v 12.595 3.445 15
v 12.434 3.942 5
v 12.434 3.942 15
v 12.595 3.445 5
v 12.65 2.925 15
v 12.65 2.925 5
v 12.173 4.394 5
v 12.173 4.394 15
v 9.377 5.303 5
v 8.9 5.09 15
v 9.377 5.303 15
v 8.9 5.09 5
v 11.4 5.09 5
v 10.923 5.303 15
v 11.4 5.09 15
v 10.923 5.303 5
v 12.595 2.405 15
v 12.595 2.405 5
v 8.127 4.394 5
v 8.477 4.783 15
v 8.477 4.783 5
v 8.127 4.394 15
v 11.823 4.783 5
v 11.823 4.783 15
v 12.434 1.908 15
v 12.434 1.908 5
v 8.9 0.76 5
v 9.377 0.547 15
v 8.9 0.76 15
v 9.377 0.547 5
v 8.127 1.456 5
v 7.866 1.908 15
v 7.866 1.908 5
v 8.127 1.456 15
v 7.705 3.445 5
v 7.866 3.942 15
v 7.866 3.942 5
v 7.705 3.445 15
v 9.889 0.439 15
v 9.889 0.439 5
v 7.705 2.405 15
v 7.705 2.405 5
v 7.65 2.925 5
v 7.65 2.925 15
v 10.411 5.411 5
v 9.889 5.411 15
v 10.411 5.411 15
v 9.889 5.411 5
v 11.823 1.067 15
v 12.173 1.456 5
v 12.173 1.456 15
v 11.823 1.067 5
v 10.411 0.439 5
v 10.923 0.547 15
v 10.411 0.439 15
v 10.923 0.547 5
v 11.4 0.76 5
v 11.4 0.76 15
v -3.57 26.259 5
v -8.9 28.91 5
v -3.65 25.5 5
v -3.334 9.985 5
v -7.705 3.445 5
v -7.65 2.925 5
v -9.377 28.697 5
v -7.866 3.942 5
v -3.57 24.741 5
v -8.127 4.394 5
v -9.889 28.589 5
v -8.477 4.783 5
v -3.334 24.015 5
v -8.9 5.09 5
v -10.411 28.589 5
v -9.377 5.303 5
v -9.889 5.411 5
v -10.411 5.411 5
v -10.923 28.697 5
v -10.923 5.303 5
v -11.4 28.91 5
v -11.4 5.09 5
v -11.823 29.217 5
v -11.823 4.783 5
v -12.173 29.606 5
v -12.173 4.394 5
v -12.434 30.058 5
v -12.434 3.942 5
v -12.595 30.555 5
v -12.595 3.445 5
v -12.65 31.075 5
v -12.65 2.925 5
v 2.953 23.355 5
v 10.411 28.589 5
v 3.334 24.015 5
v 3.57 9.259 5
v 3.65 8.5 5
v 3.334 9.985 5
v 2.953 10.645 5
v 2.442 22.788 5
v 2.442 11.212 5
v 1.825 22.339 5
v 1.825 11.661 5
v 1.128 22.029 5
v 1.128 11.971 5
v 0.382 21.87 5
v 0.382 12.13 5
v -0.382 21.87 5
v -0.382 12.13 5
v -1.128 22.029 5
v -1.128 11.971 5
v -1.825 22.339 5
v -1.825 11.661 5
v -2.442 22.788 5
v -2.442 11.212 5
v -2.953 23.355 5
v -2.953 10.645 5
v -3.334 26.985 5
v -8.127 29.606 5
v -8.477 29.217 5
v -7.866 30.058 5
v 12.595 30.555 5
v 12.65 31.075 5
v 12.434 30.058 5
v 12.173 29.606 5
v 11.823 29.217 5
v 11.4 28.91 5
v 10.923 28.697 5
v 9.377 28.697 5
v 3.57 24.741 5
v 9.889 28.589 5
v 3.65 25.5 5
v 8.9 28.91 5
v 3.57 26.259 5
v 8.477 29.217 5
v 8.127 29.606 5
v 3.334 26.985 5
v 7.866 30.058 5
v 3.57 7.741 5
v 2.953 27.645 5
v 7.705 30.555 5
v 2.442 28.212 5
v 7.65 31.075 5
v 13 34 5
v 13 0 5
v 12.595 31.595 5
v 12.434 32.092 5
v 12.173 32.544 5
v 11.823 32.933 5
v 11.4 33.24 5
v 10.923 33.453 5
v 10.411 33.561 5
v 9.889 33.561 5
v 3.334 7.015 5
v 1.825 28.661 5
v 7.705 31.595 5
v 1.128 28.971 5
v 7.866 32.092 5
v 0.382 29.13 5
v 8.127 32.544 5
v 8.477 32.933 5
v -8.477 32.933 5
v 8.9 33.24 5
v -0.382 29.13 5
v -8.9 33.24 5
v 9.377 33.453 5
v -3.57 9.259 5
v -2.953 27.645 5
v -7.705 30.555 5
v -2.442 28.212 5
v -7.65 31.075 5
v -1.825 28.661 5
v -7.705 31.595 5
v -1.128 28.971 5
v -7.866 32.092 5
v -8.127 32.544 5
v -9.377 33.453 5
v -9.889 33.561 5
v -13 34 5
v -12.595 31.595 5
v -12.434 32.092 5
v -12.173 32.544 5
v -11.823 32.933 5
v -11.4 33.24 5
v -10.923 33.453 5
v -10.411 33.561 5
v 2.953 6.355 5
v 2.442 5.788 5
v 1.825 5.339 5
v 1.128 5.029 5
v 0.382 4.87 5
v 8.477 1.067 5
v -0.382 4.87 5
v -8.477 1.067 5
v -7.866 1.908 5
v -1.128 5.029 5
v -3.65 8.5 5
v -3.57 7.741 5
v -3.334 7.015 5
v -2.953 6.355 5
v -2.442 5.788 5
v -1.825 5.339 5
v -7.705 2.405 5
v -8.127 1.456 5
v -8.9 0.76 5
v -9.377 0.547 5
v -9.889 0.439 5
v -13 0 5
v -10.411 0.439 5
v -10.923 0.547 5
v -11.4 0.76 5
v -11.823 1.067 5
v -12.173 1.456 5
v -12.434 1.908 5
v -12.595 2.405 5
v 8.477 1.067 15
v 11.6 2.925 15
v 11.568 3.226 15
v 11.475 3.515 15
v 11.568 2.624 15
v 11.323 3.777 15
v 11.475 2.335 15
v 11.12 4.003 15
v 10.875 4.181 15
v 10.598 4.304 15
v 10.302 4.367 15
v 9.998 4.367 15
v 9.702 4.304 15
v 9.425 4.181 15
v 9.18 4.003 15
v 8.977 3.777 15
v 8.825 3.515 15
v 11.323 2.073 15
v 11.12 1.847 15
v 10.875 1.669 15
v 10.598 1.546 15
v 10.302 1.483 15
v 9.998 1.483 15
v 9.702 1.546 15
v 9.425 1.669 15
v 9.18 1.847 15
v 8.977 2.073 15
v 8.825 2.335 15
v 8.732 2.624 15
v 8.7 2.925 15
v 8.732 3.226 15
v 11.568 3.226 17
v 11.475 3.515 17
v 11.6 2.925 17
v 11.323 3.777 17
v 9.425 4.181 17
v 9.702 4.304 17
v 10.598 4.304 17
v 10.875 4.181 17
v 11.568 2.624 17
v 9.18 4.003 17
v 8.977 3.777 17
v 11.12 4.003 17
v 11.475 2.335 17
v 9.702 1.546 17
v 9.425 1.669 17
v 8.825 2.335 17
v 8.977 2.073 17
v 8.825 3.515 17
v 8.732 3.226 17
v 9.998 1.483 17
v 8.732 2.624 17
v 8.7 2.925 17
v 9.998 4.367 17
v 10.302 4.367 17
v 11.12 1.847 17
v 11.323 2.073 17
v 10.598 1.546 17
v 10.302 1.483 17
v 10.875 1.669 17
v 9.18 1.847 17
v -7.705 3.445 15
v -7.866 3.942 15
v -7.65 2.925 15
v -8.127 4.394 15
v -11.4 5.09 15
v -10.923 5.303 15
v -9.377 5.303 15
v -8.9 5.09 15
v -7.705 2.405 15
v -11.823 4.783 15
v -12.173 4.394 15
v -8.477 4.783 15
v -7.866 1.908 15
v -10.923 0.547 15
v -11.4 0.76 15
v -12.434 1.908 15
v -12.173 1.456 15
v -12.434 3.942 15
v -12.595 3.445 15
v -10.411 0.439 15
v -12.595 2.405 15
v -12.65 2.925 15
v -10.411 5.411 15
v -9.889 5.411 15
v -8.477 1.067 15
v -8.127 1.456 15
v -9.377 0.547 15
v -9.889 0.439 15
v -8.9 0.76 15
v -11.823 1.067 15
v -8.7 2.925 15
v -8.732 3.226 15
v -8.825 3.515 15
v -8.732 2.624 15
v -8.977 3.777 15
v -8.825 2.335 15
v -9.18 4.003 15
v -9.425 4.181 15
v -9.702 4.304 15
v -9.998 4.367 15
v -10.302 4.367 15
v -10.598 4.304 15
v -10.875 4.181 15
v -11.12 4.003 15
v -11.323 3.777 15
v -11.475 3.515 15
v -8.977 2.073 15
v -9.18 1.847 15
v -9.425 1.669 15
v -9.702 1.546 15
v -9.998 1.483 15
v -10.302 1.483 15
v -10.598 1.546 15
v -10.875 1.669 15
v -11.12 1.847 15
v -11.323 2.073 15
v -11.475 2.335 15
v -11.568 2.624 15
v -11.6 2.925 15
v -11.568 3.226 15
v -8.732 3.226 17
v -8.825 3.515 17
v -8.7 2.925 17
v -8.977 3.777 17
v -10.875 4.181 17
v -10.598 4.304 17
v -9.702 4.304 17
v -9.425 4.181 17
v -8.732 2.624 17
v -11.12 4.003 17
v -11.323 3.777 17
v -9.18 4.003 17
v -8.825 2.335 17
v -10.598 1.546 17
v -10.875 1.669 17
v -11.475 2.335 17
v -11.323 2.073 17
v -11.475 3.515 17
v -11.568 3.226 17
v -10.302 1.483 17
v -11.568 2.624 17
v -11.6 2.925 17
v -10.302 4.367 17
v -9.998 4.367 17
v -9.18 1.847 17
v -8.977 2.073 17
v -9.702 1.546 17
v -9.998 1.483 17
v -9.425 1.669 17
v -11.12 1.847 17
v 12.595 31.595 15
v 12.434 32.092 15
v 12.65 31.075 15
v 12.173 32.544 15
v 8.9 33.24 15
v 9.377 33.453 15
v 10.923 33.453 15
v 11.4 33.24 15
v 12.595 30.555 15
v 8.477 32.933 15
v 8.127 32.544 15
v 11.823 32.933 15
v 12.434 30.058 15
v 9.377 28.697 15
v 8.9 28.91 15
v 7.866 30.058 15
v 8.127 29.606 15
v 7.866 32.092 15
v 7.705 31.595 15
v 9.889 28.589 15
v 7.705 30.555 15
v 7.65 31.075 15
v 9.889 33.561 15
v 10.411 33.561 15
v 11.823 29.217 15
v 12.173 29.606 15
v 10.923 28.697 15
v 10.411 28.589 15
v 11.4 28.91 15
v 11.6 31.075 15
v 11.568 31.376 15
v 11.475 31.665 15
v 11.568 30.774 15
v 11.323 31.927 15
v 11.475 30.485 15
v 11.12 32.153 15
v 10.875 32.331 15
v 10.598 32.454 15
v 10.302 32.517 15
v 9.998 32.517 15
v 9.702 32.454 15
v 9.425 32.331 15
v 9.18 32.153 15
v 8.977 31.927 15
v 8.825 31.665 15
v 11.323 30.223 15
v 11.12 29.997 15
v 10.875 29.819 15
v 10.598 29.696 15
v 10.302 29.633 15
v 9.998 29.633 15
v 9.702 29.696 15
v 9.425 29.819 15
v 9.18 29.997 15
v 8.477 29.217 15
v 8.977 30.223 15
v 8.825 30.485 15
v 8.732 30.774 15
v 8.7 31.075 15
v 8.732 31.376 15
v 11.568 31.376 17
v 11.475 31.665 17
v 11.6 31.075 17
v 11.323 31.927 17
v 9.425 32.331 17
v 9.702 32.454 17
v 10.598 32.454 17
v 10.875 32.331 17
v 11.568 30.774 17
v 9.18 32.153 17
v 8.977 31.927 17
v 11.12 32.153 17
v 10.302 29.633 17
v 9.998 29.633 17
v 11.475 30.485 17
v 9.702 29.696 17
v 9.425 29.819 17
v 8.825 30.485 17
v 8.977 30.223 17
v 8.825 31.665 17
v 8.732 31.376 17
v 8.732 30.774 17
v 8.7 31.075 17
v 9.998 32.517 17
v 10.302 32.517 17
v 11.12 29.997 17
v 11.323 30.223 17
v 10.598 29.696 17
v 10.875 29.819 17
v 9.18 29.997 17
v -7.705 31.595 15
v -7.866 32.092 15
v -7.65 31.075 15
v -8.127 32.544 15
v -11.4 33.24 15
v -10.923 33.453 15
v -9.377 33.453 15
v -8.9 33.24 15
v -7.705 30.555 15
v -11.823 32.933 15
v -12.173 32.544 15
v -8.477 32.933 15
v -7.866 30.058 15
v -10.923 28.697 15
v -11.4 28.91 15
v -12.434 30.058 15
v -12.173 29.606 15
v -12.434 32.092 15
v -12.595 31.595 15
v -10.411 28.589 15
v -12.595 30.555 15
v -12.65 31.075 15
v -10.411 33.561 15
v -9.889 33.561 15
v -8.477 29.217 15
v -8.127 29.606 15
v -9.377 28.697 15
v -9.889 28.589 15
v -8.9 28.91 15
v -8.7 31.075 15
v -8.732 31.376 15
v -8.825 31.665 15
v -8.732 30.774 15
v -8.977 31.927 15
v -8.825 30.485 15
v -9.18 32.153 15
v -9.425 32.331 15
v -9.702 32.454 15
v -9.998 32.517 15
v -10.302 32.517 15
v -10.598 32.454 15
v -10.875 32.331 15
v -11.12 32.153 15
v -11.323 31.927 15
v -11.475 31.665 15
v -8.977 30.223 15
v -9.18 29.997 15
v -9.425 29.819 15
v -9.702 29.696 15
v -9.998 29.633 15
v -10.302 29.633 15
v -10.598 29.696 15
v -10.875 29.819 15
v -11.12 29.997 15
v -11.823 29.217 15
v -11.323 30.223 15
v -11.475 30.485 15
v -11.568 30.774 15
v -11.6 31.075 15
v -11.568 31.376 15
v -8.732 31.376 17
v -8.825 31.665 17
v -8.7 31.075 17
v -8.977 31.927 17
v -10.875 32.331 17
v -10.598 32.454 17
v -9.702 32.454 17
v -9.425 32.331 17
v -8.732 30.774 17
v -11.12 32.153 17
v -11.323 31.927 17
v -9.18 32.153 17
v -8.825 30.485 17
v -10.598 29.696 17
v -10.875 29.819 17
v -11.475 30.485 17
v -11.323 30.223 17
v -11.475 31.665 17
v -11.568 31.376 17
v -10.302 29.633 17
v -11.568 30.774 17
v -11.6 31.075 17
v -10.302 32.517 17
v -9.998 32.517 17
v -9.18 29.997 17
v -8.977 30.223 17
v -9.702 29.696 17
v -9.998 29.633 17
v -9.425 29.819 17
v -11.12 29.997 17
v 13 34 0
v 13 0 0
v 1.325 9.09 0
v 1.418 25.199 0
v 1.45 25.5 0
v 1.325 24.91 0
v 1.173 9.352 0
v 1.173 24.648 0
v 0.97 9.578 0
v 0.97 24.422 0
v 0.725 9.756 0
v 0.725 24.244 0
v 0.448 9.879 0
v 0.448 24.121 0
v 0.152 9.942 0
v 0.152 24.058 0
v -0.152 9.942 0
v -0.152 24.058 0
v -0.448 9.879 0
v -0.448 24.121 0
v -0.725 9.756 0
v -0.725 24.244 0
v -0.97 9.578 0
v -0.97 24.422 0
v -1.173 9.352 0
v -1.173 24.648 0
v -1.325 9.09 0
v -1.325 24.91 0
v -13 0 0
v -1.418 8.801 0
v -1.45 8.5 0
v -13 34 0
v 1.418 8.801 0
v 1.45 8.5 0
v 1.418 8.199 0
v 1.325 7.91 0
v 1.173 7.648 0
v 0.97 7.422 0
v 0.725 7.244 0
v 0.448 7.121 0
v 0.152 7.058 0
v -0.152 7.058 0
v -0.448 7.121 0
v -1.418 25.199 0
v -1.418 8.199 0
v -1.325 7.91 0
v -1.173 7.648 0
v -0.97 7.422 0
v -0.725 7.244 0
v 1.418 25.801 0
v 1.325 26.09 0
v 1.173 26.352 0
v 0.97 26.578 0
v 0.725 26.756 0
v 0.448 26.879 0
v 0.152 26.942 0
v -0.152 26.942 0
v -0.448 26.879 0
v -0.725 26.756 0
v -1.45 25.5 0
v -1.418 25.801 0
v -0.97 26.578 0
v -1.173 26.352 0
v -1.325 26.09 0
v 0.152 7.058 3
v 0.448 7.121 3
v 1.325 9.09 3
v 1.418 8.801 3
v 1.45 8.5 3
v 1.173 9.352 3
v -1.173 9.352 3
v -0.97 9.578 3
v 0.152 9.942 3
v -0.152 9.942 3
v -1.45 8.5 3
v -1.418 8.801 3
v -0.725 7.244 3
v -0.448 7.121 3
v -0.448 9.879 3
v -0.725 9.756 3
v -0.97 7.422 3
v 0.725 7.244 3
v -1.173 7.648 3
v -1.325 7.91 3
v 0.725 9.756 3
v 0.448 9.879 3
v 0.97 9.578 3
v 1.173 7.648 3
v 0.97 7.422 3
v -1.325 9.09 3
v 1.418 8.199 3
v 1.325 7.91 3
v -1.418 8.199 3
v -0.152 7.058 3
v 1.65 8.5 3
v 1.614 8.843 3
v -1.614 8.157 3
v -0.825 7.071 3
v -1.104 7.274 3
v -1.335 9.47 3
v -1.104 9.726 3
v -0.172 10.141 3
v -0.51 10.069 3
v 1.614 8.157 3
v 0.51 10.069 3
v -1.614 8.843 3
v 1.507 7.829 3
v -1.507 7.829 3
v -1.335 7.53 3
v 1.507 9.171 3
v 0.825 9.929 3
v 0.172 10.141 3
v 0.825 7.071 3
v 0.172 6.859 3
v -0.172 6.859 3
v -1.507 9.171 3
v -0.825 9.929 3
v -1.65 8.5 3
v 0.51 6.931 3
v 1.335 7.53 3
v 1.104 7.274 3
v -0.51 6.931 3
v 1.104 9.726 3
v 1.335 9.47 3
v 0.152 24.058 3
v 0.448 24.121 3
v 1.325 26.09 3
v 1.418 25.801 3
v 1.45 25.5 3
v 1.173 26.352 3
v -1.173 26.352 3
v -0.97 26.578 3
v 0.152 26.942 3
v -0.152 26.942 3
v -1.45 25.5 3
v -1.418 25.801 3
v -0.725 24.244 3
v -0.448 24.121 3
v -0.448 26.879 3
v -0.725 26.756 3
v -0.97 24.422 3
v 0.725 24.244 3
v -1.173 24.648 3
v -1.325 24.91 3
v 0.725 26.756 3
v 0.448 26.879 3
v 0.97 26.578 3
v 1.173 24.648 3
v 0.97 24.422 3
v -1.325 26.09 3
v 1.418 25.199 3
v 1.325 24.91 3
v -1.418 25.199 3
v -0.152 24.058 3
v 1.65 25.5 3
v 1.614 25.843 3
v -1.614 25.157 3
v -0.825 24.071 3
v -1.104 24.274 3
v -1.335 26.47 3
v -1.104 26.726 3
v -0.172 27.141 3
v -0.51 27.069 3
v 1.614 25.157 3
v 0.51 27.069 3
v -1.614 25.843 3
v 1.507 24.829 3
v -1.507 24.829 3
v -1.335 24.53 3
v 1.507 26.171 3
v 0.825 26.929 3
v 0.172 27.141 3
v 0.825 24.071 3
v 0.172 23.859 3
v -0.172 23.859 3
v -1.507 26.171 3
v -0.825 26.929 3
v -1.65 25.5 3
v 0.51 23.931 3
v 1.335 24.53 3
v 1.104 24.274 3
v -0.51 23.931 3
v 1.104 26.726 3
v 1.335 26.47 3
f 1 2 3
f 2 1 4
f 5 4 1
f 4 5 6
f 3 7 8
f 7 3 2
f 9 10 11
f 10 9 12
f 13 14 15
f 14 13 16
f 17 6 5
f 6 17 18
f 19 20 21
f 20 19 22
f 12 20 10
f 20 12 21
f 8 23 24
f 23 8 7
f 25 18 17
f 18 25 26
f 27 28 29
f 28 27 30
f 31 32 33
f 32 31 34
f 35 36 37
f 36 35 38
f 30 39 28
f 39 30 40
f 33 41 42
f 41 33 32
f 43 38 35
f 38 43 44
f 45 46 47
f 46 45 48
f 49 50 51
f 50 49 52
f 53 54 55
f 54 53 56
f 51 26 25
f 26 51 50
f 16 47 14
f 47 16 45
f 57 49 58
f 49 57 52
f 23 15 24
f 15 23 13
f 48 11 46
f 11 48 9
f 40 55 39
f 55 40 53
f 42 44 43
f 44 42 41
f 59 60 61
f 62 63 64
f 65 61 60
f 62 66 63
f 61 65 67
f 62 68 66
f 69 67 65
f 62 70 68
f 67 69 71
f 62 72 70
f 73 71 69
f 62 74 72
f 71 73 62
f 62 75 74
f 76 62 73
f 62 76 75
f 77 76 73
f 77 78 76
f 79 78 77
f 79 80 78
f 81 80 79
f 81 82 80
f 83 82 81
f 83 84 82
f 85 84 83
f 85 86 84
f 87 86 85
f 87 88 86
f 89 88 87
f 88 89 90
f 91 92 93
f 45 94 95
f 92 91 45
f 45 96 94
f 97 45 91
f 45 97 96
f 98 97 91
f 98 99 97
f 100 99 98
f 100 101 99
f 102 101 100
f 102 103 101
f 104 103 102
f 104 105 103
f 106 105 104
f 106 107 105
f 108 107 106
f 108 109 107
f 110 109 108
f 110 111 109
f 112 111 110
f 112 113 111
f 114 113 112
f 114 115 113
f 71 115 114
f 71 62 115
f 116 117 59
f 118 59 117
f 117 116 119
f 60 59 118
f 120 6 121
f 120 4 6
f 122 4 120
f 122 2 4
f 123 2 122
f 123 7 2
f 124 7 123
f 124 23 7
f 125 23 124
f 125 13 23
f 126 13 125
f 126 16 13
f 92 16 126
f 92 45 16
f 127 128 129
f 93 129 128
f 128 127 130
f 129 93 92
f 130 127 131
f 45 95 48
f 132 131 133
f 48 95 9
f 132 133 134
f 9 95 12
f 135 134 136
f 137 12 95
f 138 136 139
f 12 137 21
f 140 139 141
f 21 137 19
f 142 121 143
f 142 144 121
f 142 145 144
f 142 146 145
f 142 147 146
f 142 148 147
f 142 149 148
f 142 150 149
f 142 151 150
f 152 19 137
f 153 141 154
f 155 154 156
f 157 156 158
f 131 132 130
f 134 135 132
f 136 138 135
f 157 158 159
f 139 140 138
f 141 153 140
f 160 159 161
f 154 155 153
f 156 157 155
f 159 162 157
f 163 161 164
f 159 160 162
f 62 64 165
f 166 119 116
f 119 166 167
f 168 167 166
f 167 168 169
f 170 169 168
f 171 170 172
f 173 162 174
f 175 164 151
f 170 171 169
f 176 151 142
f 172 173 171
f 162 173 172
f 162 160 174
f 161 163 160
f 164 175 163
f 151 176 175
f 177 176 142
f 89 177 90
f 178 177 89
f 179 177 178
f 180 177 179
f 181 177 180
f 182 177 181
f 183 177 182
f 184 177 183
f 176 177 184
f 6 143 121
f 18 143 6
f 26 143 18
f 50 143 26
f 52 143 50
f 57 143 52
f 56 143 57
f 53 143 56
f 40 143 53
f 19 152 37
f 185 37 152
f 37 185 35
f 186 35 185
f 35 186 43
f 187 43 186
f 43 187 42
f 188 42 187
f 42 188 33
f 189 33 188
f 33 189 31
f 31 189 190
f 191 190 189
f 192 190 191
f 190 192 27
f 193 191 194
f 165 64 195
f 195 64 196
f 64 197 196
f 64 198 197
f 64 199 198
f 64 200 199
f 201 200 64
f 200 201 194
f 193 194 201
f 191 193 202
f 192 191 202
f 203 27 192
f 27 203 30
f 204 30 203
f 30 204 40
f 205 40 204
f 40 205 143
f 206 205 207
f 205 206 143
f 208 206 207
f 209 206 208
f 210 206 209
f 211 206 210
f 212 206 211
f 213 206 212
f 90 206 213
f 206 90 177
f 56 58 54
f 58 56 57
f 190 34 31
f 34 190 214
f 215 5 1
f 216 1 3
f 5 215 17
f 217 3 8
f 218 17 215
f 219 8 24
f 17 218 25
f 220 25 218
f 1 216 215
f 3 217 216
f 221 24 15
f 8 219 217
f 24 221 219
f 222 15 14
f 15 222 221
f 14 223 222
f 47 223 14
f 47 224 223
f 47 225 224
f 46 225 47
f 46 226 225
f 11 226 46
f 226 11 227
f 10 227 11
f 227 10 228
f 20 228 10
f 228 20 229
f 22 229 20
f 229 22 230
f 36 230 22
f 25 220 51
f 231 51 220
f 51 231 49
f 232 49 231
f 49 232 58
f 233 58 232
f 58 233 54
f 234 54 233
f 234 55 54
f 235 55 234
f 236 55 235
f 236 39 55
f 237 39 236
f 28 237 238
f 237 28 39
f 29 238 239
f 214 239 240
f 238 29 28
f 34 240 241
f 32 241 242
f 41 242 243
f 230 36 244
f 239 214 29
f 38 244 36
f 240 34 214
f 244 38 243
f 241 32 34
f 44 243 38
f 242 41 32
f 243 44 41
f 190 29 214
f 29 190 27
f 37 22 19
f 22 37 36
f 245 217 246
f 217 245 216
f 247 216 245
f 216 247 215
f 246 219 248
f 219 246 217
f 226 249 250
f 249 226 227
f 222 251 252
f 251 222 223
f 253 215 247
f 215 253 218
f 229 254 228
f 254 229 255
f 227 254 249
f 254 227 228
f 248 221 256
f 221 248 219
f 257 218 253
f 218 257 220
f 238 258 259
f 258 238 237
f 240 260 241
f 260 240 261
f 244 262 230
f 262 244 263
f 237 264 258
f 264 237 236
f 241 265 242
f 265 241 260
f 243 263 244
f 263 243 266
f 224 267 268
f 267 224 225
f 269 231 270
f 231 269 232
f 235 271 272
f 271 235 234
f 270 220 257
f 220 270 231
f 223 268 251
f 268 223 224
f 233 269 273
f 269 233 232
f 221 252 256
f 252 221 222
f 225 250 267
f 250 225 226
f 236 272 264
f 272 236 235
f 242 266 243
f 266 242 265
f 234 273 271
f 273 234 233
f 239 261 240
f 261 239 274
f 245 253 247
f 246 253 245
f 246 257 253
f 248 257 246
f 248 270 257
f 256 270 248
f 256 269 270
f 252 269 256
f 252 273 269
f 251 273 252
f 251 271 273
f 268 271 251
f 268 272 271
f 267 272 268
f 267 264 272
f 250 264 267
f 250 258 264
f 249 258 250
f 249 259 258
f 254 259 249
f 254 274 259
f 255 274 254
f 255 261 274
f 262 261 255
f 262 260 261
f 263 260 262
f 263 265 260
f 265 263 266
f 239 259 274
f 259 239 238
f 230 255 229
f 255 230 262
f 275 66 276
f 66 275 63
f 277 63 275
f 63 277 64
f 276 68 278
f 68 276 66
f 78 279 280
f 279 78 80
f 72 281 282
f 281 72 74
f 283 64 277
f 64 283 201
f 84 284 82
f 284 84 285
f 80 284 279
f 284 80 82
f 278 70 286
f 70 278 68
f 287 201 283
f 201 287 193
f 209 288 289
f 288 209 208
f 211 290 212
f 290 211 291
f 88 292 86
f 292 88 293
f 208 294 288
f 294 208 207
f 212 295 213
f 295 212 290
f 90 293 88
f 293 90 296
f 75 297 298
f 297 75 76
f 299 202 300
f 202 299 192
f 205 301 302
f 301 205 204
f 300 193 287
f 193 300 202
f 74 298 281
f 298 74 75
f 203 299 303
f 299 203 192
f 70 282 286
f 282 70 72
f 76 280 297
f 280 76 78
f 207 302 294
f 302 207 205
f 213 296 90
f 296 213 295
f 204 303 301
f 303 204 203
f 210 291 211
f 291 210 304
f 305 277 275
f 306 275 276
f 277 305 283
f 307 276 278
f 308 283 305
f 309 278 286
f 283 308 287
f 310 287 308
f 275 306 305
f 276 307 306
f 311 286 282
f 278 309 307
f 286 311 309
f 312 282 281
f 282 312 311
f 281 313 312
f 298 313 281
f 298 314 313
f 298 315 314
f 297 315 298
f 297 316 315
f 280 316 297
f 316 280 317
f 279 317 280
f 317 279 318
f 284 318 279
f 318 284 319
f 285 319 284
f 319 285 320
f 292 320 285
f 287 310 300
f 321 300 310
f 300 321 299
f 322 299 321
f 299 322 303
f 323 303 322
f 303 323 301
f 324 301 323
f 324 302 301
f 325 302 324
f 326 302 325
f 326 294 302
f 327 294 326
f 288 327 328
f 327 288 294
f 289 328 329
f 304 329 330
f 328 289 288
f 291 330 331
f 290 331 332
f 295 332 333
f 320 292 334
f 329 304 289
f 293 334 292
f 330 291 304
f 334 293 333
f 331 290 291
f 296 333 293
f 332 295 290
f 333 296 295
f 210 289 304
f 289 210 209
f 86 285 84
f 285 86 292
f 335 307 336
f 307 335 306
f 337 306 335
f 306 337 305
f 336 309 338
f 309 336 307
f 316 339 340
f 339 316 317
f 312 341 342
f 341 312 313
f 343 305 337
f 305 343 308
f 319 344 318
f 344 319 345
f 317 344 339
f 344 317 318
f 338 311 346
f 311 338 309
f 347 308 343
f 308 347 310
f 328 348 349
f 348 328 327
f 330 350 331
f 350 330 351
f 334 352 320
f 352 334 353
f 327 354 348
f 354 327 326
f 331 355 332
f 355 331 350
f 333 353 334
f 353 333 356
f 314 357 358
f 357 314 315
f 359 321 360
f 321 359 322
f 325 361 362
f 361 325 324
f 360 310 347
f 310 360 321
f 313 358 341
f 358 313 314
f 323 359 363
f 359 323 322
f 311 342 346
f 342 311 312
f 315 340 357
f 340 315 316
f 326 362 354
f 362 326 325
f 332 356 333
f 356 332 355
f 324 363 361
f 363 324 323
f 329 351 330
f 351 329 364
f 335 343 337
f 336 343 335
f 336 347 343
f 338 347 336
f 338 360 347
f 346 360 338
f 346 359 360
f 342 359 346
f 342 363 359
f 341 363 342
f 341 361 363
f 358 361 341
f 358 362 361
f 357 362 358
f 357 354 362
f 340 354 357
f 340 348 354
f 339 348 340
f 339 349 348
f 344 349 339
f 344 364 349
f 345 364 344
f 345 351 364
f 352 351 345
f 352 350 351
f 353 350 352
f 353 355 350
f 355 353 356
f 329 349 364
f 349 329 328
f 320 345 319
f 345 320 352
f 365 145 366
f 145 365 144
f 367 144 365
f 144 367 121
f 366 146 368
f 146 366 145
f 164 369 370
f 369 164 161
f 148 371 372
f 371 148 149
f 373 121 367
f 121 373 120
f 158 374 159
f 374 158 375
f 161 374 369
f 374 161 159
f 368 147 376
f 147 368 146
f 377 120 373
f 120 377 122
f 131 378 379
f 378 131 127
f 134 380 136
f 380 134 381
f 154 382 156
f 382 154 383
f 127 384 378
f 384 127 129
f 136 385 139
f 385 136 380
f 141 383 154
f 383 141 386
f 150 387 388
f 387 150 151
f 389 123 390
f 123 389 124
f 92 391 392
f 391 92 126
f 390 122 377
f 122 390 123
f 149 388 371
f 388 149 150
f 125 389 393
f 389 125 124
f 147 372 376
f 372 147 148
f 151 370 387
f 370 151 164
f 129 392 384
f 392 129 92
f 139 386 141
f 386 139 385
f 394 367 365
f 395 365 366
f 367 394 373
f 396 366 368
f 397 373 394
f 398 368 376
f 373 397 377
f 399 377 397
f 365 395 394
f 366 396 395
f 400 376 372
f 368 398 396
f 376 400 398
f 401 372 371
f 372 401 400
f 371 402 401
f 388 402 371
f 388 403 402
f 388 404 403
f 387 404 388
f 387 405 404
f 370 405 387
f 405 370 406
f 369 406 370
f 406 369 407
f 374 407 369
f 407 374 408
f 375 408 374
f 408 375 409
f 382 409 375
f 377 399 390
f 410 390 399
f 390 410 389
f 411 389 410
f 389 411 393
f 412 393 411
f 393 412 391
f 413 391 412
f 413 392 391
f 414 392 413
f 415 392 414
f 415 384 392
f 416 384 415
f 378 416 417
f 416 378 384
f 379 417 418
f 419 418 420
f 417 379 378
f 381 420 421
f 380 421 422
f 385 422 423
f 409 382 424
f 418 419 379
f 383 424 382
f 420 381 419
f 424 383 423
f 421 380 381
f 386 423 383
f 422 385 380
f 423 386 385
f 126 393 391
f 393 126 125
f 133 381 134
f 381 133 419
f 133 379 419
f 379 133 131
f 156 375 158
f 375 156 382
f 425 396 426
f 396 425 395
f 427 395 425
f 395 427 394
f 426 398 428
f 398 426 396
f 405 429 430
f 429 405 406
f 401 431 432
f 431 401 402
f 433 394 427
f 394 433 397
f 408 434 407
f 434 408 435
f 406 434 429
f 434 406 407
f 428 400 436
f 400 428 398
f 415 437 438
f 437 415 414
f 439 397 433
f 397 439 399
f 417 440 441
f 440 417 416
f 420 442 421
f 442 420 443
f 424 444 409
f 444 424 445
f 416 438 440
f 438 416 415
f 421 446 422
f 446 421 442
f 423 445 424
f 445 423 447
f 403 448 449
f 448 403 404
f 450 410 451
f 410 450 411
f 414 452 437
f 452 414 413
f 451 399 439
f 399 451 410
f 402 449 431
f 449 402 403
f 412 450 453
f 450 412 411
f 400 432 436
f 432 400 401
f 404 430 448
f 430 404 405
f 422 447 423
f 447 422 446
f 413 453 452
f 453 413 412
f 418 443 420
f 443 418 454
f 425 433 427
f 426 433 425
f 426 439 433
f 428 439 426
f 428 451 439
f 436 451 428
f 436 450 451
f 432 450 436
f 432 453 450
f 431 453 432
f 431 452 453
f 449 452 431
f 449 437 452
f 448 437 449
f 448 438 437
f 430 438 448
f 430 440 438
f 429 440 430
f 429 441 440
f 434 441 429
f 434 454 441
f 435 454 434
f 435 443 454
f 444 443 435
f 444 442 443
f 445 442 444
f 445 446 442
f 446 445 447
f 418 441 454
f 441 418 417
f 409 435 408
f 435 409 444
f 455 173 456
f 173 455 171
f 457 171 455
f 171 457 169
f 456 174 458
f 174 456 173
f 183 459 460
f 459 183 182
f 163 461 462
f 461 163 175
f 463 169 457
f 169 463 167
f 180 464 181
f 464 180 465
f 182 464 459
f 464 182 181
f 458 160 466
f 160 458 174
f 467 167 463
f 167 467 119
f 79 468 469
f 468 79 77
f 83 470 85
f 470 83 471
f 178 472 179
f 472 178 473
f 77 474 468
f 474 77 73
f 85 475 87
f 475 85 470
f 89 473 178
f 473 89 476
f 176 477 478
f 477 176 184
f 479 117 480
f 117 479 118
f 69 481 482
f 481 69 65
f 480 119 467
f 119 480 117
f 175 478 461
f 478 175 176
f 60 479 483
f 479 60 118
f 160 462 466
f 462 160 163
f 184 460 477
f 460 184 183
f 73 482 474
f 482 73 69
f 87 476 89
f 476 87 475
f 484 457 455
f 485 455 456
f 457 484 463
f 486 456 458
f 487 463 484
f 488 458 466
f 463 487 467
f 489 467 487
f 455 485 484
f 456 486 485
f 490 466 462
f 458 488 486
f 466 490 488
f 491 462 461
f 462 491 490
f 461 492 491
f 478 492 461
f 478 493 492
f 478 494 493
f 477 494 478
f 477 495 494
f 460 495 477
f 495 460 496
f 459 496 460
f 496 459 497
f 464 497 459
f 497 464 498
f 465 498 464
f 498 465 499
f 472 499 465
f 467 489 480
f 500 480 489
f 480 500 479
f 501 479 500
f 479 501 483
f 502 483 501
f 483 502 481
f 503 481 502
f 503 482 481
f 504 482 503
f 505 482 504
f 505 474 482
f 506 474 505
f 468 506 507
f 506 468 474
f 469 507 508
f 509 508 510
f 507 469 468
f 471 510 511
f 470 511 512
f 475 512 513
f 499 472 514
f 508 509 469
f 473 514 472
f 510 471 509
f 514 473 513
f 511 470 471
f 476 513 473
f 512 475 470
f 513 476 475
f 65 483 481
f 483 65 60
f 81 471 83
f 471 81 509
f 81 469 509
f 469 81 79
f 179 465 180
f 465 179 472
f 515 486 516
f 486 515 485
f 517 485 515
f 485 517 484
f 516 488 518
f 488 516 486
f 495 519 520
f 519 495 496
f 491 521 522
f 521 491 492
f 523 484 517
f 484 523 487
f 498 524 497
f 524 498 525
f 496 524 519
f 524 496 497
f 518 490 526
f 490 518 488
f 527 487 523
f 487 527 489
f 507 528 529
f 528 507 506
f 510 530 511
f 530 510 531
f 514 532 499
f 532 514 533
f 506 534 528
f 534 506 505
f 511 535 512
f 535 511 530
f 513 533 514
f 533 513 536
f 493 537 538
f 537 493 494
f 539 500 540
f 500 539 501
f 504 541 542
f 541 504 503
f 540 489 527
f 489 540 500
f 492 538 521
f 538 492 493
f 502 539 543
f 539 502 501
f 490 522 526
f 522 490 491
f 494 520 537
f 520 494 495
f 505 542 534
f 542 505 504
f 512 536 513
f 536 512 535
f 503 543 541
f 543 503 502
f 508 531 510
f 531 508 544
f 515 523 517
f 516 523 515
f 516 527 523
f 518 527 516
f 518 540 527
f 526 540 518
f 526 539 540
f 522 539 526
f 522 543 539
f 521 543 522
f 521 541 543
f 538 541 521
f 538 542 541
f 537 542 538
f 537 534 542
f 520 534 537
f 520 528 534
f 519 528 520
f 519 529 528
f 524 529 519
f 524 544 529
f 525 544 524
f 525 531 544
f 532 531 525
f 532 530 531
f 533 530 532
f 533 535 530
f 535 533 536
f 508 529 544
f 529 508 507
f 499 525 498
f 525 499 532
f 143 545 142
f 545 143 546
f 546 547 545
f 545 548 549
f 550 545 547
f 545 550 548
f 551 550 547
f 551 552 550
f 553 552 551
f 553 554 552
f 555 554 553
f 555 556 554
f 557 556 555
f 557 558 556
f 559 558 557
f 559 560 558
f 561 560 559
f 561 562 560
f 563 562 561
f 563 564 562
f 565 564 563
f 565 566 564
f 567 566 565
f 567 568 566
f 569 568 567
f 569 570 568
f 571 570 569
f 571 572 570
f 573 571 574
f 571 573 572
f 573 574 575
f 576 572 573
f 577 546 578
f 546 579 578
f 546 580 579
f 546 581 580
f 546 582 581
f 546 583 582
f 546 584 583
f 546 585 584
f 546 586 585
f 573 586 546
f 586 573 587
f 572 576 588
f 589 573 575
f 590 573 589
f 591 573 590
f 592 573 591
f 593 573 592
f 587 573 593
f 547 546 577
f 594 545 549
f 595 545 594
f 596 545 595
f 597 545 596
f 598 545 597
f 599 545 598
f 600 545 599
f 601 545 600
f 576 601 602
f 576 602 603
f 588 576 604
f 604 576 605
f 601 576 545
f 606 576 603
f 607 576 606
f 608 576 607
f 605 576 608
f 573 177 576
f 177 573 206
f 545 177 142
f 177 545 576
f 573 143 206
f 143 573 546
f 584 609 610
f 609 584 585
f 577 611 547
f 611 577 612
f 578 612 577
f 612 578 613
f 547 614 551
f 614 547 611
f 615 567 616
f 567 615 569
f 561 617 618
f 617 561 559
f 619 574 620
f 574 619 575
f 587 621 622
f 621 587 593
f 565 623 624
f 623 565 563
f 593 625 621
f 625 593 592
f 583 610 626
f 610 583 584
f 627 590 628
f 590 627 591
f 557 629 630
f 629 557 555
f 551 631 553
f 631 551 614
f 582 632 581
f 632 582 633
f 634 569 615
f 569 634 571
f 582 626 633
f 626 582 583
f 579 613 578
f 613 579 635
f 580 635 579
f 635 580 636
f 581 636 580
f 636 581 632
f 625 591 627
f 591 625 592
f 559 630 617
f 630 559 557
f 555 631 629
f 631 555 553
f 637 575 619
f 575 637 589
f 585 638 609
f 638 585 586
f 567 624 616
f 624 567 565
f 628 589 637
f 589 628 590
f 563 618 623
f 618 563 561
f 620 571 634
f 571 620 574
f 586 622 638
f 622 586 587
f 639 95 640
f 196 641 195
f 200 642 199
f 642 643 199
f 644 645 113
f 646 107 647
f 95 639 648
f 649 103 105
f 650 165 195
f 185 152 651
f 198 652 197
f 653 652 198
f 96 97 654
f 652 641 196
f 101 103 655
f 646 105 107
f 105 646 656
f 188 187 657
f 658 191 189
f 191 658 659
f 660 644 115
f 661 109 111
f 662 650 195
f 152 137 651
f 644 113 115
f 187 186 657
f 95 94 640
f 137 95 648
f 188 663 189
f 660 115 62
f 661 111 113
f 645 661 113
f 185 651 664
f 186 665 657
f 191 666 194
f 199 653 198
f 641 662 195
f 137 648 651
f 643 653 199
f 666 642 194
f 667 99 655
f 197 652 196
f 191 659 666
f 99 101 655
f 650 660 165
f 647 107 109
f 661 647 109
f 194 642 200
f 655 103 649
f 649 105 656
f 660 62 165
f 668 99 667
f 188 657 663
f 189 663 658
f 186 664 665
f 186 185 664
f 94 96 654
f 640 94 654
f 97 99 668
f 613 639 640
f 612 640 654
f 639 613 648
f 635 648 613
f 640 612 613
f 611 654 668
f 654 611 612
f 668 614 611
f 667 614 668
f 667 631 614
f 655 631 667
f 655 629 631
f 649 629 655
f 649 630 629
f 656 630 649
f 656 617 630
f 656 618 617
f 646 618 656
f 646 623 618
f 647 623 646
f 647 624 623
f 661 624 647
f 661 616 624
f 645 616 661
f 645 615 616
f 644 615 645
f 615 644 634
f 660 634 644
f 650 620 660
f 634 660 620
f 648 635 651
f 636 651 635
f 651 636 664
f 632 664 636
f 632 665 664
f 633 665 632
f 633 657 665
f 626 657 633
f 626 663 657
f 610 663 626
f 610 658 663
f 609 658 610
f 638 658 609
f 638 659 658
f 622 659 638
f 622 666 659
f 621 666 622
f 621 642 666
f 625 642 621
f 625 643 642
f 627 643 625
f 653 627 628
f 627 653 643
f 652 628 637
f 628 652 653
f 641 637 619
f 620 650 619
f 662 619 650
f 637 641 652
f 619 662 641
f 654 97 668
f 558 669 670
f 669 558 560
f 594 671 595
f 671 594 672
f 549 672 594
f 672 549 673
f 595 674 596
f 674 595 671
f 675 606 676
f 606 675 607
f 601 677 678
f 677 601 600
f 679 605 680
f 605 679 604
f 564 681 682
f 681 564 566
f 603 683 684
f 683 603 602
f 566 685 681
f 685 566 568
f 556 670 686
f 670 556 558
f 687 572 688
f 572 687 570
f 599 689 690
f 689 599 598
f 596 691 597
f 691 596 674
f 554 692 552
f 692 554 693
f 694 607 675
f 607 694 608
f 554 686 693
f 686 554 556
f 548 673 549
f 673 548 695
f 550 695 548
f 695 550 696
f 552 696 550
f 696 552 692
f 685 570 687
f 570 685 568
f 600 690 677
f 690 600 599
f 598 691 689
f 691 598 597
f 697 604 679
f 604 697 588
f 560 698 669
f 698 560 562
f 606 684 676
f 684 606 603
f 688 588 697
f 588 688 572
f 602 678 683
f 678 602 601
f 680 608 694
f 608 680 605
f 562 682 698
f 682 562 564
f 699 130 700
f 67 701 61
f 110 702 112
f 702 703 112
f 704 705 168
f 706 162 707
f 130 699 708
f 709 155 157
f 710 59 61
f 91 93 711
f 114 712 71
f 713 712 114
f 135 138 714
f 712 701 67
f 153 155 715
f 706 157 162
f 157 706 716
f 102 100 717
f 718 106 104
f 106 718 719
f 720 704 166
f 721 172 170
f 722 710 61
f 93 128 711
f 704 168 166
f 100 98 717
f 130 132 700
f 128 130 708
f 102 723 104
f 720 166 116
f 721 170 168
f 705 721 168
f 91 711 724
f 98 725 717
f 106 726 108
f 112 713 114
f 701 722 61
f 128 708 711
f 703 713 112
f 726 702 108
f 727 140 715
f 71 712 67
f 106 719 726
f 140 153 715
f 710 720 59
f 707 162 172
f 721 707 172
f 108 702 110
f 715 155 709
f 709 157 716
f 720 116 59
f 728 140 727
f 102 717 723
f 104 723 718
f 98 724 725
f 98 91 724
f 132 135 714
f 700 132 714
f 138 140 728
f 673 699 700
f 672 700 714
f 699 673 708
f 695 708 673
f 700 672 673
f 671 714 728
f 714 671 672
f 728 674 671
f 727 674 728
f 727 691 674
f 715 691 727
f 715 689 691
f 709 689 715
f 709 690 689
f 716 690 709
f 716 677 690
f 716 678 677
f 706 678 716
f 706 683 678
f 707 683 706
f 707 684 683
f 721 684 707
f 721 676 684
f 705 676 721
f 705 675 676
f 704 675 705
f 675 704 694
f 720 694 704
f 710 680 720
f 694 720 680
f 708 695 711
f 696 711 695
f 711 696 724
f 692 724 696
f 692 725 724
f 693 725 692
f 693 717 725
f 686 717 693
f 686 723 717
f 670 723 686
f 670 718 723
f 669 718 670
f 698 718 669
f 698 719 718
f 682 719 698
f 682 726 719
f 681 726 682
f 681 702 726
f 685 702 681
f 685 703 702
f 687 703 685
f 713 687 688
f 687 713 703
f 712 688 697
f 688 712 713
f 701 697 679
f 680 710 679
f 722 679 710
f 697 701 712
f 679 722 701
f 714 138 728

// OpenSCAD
// Screwless mount for the relay.
// mounting holes: 2.9mm diameter
// center-center hole distance X=20.3 mm
// center-center hole distance Y=28.15mm

$fn=30; // Number of facets
bh=5; // base height
bx=26; // base x
by=34; // base y
dx=20.3; // post distance x
dy=28.15; // post distance y 

module spacer(x=0, y=0, z=0){
    translate([x,y,z]){
        cylinder(d=5, h=10);
        cylinder(d=2.9, h=12);
    }
    }

sx0 = dx/2;
y0 = (by-dy)/2;
y1 = (by-dy)/2+dy;
spacer(dx/2, y0, bh);
spacer(-dx/2, y0, bh);
spacer(dx/2, y1, bh);
spacer(-dx/2, y1, bh);
   
// Draw base
module base() {
    translate([-bx/2,0,0]){
    cube([bx, by, bh]);
    }
}

// Mounting holes
// #6 screw = 3.3mm diameter
difference(){
    base();
    // first hole
    translate([0, by/4, 0]){
    cylinder(d=2.9, h=bh);
    }
    chamfer(0, by/4, bh-2);
    // second hole
    translate([0, 3*by/4, 0]){
    cylinder(d=2.9, h=bh);
    }
    chamfer(0, 3*by/4, bh-2);
}

module chamfer(x,y,z,cd=3.3, cw=2){
    // x, y, z = center coordinates of chamfer
    // cd: chamfer smallest diameter
    // cw: width of chamfer.  
    color("red")
    translate([x, y, z]){
    cylinder(d1=cd, d2=cd+2*cw, h=cw);
    }
}
